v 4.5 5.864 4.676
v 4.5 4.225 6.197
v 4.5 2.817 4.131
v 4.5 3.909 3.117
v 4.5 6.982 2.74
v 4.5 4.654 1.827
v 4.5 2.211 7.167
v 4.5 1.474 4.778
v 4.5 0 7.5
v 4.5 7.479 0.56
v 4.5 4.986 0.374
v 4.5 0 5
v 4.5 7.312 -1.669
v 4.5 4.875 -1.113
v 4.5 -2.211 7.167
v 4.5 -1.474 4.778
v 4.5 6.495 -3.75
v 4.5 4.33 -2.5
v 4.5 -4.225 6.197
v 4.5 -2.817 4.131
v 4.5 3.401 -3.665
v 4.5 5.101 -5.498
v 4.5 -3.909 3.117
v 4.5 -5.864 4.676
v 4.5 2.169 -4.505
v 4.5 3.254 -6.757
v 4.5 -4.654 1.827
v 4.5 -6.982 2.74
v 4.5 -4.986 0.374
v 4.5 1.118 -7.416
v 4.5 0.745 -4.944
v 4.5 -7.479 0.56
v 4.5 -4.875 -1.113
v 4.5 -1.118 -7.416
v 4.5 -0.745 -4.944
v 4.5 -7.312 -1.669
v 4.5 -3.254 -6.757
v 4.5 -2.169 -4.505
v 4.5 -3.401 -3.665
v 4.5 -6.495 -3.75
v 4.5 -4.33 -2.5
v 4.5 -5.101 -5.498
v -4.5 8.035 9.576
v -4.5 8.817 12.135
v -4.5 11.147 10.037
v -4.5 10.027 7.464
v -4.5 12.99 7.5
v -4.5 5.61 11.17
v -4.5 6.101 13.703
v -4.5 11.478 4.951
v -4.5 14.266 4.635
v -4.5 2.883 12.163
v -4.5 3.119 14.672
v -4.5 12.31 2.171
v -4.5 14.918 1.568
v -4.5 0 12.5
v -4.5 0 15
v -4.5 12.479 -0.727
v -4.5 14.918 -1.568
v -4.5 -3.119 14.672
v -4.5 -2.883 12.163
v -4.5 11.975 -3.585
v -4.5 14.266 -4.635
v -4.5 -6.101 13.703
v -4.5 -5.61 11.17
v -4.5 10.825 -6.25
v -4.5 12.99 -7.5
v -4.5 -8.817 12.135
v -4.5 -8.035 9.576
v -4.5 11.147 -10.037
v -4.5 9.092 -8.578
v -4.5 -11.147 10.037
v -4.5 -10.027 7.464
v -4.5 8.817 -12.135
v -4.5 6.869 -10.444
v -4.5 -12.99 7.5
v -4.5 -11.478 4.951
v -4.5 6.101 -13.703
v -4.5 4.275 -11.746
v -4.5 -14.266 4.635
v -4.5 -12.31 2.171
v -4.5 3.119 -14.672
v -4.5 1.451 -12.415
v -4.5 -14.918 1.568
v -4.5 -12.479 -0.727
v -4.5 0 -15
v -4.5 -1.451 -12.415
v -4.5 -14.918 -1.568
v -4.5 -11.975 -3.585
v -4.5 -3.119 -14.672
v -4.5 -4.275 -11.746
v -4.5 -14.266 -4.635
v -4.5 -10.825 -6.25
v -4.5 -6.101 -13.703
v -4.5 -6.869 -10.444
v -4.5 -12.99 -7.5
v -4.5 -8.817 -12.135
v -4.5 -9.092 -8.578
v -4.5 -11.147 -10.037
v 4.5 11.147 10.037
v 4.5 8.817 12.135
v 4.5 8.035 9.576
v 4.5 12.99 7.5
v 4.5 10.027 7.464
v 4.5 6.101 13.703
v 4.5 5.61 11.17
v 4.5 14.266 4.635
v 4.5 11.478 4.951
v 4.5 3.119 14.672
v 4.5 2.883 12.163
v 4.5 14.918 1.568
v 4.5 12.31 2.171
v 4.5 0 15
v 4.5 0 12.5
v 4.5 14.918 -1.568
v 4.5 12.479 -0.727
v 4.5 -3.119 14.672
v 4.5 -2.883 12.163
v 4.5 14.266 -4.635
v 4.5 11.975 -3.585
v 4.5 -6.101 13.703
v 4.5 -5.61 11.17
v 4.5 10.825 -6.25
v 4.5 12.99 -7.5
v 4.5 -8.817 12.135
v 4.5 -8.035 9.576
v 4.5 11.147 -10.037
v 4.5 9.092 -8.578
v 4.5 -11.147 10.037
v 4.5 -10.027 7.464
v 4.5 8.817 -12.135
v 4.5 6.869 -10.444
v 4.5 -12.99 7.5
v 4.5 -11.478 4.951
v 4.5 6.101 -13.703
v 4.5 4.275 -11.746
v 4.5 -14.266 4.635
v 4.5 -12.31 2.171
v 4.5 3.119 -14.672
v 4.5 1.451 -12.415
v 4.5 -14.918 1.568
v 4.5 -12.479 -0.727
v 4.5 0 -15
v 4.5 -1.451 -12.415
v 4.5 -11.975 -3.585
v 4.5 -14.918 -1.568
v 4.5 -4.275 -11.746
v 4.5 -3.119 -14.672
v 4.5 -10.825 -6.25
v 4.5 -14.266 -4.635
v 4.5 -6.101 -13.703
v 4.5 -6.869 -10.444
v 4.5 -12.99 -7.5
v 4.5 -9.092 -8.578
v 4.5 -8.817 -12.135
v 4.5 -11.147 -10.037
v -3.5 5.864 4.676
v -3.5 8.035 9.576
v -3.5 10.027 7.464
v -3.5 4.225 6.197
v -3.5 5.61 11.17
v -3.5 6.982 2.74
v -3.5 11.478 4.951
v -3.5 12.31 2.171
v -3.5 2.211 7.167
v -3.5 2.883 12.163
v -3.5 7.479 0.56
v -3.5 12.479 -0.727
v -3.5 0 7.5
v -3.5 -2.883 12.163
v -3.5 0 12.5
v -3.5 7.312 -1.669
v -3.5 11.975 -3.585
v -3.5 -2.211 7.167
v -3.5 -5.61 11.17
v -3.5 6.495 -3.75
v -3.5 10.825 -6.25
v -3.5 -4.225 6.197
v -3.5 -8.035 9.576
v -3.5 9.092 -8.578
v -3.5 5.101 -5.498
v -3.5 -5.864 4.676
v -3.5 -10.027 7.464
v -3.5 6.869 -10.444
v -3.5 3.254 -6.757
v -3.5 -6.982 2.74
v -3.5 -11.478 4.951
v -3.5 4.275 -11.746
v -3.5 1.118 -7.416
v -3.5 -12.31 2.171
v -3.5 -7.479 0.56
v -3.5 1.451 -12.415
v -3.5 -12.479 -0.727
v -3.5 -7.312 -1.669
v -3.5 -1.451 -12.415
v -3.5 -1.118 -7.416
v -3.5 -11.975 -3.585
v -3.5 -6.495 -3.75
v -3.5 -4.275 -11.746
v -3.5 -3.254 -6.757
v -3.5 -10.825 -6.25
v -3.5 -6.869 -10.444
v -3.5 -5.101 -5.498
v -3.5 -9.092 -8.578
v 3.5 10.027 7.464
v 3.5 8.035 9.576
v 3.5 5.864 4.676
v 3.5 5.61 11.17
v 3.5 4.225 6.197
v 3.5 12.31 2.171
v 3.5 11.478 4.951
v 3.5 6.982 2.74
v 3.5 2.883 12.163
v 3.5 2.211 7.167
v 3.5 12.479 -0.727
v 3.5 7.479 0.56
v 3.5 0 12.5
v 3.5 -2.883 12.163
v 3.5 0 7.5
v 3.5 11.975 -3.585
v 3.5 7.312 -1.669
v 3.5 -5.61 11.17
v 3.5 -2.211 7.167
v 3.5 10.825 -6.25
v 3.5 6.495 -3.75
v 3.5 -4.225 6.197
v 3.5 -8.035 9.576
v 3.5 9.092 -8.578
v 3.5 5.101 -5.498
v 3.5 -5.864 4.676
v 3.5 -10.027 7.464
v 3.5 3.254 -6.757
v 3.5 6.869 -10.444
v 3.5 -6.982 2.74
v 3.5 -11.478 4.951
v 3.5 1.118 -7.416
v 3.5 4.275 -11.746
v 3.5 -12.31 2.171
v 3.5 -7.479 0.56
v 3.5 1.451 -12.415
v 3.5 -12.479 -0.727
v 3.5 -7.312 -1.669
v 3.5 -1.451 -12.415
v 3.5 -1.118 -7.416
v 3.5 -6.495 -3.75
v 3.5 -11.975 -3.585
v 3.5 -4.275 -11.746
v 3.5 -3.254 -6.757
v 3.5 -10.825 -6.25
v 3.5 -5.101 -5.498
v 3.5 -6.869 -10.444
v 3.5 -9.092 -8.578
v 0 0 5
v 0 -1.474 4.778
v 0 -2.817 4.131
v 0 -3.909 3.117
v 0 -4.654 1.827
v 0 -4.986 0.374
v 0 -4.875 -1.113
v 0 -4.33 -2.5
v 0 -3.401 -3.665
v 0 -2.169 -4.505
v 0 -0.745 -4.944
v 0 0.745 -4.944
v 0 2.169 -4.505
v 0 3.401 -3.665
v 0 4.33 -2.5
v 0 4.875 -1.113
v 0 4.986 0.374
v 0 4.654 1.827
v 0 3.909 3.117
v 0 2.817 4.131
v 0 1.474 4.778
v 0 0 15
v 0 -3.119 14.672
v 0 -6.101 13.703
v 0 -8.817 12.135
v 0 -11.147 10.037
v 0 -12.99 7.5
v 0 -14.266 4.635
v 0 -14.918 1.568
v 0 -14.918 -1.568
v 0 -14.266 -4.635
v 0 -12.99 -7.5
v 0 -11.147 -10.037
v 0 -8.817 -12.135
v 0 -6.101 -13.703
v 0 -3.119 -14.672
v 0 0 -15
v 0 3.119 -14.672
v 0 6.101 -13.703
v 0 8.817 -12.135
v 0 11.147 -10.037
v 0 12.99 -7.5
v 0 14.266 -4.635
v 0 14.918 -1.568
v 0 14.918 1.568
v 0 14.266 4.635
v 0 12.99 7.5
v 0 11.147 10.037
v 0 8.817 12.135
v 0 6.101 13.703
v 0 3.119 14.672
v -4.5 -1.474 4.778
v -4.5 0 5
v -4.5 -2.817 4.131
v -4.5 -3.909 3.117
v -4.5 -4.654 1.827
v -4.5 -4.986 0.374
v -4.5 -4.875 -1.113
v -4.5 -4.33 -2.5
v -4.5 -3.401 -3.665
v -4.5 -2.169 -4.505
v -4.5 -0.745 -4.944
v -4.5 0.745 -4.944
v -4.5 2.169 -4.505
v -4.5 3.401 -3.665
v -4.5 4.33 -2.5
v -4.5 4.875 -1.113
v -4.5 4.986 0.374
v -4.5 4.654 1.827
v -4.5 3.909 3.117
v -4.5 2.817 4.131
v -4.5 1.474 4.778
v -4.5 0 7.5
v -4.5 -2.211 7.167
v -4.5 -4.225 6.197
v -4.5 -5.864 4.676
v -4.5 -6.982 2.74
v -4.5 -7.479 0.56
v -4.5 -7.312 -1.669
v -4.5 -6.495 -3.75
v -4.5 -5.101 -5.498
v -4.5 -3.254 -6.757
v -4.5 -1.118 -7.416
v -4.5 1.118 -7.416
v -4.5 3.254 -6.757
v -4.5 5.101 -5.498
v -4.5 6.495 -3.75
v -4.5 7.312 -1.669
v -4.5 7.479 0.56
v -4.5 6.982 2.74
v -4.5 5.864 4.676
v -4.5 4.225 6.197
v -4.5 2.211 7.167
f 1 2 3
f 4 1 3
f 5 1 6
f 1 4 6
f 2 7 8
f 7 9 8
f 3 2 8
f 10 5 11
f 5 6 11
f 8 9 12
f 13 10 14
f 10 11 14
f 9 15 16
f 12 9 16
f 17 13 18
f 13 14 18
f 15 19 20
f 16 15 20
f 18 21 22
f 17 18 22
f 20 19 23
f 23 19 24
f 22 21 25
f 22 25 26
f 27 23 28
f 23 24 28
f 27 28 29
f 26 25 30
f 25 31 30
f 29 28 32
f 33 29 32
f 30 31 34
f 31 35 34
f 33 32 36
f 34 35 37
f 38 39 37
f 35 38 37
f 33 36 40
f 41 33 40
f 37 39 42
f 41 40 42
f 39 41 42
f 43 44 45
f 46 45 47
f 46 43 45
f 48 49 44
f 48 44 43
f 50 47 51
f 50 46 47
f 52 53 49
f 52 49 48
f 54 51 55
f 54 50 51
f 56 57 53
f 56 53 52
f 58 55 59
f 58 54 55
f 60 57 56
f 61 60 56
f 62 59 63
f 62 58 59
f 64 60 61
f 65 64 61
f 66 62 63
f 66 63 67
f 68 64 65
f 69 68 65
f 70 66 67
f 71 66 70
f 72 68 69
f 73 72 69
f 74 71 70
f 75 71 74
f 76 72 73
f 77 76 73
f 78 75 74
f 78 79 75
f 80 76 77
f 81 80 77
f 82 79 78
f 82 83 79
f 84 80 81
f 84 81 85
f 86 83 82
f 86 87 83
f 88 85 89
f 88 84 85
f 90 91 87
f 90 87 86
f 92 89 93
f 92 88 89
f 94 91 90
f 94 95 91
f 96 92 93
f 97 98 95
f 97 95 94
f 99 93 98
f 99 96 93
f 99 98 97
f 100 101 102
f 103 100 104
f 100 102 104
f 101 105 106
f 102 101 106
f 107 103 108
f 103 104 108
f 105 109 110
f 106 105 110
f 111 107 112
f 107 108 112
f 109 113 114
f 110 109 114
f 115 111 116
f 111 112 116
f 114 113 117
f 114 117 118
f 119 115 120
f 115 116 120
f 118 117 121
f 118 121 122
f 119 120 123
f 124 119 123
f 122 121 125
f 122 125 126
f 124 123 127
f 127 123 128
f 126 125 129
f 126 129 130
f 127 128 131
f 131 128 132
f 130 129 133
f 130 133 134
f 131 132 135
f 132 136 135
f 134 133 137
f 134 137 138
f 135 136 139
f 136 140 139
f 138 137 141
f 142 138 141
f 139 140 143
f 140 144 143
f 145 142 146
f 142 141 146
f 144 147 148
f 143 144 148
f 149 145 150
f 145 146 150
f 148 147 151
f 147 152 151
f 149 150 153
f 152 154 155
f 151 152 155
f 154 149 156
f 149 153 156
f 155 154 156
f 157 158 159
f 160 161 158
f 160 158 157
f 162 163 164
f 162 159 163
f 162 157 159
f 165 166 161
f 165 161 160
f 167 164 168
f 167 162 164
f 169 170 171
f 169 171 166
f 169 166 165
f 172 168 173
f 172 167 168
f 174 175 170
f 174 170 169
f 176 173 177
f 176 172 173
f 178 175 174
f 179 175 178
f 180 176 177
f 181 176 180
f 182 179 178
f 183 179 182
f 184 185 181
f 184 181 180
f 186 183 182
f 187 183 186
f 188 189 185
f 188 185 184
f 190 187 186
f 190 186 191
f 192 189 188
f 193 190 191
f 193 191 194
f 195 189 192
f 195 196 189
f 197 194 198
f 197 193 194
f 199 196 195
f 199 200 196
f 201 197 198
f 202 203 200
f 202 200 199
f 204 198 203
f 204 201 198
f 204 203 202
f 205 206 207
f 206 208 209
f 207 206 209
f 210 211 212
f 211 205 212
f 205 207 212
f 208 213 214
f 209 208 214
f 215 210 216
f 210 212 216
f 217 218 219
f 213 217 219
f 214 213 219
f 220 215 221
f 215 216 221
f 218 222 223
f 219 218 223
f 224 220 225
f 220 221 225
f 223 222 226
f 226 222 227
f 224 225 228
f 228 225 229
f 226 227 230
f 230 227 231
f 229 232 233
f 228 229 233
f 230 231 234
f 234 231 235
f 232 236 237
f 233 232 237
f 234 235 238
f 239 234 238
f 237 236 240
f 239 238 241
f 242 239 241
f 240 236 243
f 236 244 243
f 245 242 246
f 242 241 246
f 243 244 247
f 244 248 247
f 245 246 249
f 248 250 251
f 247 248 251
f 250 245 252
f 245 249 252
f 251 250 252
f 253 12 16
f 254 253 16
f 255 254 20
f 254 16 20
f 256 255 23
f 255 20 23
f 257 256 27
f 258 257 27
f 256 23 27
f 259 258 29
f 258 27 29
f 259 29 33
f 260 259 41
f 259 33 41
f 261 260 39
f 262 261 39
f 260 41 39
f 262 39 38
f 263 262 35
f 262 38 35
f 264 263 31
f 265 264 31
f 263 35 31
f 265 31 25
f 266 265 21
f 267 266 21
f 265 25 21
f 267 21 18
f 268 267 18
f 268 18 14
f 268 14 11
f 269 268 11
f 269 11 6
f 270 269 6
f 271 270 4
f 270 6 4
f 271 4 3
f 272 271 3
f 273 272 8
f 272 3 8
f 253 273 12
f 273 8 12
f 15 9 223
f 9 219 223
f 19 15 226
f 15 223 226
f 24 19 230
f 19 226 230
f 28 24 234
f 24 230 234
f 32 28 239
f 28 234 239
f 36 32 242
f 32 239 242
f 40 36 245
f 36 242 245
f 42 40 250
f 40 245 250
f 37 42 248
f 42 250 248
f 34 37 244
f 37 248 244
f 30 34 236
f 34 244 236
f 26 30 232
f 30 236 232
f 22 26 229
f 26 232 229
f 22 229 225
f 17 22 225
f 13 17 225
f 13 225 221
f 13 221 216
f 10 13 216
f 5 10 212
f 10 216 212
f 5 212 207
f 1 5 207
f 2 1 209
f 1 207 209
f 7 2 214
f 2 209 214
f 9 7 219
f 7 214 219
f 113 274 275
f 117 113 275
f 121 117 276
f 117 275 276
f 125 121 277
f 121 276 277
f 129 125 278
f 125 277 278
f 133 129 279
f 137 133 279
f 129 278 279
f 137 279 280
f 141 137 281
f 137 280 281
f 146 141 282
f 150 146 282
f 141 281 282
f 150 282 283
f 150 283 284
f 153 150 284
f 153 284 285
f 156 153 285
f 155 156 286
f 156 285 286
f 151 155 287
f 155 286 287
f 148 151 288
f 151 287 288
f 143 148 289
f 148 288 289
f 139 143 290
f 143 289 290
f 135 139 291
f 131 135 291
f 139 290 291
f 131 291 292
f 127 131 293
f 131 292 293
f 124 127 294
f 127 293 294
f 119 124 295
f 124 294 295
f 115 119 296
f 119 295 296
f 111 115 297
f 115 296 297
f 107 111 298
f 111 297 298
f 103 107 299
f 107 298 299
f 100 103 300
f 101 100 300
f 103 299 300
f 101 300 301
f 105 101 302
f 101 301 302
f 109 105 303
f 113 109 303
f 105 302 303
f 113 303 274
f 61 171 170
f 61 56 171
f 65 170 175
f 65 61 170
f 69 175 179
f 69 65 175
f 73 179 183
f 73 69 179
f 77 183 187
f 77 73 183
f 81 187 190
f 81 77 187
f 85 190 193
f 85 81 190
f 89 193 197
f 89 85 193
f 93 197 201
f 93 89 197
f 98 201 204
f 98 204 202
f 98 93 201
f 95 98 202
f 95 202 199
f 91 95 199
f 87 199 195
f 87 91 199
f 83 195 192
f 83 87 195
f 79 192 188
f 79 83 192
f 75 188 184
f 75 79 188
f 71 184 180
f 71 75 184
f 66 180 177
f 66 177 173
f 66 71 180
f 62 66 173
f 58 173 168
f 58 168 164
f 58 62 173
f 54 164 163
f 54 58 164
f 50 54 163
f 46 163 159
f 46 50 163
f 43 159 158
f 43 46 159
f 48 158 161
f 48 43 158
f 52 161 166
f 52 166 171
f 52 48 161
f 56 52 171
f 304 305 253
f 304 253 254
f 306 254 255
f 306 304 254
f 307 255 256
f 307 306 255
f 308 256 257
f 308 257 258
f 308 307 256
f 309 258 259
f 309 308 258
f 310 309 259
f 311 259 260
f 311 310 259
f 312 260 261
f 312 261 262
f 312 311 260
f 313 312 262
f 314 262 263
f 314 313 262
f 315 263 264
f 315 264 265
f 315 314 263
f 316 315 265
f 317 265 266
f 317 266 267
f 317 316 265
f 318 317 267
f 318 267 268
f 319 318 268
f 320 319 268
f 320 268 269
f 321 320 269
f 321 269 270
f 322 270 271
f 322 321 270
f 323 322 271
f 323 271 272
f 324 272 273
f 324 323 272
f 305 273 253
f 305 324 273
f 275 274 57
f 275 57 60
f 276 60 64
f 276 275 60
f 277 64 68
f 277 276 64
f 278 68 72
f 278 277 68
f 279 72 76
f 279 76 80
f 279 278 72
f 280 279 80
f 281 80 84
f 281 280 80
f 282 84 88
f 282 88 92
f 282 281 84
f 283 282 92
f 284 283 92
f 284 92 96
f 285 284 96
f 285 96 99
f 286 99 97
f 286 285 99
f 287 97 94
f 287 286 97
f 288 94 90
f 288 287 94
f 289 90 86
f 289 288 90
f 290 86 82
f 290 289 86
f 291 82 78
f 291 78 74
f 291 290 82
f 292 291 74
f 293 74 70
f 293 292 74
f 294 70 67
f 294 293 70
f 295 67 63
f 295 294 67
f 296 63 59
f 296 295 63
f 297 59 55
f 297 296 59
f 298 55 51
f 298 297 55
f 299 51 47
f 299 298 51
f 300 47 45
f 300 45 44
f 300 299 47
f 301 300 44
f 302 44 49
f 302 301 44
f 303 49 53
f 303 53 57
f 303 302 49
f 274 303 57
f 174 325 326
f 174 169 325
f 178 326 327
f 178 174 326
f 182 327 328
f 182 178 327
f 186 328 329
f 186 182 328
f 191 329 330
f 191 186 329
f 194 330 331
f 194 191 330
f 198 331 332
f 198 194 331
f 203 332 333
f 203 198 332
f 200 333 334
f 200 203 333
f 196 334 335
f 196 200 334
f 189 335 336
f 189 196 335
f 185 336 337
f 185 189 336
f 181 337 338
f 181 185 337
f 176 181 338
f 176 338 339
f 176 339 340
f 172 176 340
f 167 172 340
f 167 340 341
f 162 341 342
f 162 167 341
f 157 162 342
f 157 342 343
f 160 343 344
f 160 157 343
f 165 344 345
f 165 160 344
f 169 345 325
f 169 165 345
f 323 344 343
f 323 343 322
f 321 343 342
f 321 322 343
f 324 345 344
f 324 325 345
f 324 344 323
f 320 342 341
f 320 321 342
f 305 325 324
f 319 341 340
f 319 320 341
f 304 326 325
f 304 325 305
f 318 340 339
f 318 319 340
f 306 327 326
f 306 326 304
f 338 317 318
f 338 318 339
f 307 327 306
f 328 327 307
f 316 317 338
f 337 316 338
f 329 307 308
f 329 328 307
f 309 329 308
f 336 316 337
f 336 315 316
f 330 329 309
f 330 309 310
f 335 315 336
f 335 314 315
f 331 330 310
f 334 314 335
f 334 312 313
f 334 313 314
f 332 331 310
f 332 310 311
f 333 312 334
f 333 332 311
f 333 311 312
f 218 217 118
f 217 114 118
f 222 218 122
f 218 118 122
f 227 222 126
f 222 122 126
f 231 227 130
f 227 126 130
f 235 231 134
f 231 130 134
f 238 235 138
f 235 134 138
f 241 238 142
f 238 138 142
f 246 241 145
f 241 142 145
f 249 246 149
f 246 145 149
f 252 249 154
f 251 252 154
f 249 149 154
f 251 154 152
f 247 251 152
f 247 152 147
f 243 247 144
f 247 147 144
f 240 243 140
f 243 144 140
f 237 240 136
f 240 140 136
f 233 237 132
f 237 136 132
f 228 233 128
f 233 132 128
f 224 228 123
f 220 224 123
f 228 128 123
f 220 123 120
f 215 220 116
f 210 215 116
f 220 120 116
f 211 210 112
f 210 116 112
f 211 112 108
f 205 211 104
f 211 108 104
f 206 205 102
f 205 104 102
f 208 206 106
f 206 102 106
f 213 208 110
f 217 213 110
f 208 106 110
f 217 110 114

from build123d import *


with BuildPart() as part:
    # Sketch1 → Revolve1 (revolve)
    with BuildSketch(Plane.XY, mode=Mode.PRIVATE) as revolve1_sk:
        Polygon((0, 5), (4.5, 5), (4.5, 7.5), (3.5, 7.5), (3.5, 12.5), (4.5, 12.5), (4.5, 15), (0, 15), align=None)
    revolve1 = revolve(revolve1_sk.sketch.rotate(Axis((-243.027564124, 0, 0), (1, 0, 0)), 90), axis=Axis((-243.027564124, 0, 0), (1, 0, 0)))

    # Mirror1: Revolve1 across Right Plane
    add(revolve1.mirror(Plane(origin=(0, 0, 0), x_dir=(0, 0, -1), z_dir=(1, 0, 0))))


solid = part.part
